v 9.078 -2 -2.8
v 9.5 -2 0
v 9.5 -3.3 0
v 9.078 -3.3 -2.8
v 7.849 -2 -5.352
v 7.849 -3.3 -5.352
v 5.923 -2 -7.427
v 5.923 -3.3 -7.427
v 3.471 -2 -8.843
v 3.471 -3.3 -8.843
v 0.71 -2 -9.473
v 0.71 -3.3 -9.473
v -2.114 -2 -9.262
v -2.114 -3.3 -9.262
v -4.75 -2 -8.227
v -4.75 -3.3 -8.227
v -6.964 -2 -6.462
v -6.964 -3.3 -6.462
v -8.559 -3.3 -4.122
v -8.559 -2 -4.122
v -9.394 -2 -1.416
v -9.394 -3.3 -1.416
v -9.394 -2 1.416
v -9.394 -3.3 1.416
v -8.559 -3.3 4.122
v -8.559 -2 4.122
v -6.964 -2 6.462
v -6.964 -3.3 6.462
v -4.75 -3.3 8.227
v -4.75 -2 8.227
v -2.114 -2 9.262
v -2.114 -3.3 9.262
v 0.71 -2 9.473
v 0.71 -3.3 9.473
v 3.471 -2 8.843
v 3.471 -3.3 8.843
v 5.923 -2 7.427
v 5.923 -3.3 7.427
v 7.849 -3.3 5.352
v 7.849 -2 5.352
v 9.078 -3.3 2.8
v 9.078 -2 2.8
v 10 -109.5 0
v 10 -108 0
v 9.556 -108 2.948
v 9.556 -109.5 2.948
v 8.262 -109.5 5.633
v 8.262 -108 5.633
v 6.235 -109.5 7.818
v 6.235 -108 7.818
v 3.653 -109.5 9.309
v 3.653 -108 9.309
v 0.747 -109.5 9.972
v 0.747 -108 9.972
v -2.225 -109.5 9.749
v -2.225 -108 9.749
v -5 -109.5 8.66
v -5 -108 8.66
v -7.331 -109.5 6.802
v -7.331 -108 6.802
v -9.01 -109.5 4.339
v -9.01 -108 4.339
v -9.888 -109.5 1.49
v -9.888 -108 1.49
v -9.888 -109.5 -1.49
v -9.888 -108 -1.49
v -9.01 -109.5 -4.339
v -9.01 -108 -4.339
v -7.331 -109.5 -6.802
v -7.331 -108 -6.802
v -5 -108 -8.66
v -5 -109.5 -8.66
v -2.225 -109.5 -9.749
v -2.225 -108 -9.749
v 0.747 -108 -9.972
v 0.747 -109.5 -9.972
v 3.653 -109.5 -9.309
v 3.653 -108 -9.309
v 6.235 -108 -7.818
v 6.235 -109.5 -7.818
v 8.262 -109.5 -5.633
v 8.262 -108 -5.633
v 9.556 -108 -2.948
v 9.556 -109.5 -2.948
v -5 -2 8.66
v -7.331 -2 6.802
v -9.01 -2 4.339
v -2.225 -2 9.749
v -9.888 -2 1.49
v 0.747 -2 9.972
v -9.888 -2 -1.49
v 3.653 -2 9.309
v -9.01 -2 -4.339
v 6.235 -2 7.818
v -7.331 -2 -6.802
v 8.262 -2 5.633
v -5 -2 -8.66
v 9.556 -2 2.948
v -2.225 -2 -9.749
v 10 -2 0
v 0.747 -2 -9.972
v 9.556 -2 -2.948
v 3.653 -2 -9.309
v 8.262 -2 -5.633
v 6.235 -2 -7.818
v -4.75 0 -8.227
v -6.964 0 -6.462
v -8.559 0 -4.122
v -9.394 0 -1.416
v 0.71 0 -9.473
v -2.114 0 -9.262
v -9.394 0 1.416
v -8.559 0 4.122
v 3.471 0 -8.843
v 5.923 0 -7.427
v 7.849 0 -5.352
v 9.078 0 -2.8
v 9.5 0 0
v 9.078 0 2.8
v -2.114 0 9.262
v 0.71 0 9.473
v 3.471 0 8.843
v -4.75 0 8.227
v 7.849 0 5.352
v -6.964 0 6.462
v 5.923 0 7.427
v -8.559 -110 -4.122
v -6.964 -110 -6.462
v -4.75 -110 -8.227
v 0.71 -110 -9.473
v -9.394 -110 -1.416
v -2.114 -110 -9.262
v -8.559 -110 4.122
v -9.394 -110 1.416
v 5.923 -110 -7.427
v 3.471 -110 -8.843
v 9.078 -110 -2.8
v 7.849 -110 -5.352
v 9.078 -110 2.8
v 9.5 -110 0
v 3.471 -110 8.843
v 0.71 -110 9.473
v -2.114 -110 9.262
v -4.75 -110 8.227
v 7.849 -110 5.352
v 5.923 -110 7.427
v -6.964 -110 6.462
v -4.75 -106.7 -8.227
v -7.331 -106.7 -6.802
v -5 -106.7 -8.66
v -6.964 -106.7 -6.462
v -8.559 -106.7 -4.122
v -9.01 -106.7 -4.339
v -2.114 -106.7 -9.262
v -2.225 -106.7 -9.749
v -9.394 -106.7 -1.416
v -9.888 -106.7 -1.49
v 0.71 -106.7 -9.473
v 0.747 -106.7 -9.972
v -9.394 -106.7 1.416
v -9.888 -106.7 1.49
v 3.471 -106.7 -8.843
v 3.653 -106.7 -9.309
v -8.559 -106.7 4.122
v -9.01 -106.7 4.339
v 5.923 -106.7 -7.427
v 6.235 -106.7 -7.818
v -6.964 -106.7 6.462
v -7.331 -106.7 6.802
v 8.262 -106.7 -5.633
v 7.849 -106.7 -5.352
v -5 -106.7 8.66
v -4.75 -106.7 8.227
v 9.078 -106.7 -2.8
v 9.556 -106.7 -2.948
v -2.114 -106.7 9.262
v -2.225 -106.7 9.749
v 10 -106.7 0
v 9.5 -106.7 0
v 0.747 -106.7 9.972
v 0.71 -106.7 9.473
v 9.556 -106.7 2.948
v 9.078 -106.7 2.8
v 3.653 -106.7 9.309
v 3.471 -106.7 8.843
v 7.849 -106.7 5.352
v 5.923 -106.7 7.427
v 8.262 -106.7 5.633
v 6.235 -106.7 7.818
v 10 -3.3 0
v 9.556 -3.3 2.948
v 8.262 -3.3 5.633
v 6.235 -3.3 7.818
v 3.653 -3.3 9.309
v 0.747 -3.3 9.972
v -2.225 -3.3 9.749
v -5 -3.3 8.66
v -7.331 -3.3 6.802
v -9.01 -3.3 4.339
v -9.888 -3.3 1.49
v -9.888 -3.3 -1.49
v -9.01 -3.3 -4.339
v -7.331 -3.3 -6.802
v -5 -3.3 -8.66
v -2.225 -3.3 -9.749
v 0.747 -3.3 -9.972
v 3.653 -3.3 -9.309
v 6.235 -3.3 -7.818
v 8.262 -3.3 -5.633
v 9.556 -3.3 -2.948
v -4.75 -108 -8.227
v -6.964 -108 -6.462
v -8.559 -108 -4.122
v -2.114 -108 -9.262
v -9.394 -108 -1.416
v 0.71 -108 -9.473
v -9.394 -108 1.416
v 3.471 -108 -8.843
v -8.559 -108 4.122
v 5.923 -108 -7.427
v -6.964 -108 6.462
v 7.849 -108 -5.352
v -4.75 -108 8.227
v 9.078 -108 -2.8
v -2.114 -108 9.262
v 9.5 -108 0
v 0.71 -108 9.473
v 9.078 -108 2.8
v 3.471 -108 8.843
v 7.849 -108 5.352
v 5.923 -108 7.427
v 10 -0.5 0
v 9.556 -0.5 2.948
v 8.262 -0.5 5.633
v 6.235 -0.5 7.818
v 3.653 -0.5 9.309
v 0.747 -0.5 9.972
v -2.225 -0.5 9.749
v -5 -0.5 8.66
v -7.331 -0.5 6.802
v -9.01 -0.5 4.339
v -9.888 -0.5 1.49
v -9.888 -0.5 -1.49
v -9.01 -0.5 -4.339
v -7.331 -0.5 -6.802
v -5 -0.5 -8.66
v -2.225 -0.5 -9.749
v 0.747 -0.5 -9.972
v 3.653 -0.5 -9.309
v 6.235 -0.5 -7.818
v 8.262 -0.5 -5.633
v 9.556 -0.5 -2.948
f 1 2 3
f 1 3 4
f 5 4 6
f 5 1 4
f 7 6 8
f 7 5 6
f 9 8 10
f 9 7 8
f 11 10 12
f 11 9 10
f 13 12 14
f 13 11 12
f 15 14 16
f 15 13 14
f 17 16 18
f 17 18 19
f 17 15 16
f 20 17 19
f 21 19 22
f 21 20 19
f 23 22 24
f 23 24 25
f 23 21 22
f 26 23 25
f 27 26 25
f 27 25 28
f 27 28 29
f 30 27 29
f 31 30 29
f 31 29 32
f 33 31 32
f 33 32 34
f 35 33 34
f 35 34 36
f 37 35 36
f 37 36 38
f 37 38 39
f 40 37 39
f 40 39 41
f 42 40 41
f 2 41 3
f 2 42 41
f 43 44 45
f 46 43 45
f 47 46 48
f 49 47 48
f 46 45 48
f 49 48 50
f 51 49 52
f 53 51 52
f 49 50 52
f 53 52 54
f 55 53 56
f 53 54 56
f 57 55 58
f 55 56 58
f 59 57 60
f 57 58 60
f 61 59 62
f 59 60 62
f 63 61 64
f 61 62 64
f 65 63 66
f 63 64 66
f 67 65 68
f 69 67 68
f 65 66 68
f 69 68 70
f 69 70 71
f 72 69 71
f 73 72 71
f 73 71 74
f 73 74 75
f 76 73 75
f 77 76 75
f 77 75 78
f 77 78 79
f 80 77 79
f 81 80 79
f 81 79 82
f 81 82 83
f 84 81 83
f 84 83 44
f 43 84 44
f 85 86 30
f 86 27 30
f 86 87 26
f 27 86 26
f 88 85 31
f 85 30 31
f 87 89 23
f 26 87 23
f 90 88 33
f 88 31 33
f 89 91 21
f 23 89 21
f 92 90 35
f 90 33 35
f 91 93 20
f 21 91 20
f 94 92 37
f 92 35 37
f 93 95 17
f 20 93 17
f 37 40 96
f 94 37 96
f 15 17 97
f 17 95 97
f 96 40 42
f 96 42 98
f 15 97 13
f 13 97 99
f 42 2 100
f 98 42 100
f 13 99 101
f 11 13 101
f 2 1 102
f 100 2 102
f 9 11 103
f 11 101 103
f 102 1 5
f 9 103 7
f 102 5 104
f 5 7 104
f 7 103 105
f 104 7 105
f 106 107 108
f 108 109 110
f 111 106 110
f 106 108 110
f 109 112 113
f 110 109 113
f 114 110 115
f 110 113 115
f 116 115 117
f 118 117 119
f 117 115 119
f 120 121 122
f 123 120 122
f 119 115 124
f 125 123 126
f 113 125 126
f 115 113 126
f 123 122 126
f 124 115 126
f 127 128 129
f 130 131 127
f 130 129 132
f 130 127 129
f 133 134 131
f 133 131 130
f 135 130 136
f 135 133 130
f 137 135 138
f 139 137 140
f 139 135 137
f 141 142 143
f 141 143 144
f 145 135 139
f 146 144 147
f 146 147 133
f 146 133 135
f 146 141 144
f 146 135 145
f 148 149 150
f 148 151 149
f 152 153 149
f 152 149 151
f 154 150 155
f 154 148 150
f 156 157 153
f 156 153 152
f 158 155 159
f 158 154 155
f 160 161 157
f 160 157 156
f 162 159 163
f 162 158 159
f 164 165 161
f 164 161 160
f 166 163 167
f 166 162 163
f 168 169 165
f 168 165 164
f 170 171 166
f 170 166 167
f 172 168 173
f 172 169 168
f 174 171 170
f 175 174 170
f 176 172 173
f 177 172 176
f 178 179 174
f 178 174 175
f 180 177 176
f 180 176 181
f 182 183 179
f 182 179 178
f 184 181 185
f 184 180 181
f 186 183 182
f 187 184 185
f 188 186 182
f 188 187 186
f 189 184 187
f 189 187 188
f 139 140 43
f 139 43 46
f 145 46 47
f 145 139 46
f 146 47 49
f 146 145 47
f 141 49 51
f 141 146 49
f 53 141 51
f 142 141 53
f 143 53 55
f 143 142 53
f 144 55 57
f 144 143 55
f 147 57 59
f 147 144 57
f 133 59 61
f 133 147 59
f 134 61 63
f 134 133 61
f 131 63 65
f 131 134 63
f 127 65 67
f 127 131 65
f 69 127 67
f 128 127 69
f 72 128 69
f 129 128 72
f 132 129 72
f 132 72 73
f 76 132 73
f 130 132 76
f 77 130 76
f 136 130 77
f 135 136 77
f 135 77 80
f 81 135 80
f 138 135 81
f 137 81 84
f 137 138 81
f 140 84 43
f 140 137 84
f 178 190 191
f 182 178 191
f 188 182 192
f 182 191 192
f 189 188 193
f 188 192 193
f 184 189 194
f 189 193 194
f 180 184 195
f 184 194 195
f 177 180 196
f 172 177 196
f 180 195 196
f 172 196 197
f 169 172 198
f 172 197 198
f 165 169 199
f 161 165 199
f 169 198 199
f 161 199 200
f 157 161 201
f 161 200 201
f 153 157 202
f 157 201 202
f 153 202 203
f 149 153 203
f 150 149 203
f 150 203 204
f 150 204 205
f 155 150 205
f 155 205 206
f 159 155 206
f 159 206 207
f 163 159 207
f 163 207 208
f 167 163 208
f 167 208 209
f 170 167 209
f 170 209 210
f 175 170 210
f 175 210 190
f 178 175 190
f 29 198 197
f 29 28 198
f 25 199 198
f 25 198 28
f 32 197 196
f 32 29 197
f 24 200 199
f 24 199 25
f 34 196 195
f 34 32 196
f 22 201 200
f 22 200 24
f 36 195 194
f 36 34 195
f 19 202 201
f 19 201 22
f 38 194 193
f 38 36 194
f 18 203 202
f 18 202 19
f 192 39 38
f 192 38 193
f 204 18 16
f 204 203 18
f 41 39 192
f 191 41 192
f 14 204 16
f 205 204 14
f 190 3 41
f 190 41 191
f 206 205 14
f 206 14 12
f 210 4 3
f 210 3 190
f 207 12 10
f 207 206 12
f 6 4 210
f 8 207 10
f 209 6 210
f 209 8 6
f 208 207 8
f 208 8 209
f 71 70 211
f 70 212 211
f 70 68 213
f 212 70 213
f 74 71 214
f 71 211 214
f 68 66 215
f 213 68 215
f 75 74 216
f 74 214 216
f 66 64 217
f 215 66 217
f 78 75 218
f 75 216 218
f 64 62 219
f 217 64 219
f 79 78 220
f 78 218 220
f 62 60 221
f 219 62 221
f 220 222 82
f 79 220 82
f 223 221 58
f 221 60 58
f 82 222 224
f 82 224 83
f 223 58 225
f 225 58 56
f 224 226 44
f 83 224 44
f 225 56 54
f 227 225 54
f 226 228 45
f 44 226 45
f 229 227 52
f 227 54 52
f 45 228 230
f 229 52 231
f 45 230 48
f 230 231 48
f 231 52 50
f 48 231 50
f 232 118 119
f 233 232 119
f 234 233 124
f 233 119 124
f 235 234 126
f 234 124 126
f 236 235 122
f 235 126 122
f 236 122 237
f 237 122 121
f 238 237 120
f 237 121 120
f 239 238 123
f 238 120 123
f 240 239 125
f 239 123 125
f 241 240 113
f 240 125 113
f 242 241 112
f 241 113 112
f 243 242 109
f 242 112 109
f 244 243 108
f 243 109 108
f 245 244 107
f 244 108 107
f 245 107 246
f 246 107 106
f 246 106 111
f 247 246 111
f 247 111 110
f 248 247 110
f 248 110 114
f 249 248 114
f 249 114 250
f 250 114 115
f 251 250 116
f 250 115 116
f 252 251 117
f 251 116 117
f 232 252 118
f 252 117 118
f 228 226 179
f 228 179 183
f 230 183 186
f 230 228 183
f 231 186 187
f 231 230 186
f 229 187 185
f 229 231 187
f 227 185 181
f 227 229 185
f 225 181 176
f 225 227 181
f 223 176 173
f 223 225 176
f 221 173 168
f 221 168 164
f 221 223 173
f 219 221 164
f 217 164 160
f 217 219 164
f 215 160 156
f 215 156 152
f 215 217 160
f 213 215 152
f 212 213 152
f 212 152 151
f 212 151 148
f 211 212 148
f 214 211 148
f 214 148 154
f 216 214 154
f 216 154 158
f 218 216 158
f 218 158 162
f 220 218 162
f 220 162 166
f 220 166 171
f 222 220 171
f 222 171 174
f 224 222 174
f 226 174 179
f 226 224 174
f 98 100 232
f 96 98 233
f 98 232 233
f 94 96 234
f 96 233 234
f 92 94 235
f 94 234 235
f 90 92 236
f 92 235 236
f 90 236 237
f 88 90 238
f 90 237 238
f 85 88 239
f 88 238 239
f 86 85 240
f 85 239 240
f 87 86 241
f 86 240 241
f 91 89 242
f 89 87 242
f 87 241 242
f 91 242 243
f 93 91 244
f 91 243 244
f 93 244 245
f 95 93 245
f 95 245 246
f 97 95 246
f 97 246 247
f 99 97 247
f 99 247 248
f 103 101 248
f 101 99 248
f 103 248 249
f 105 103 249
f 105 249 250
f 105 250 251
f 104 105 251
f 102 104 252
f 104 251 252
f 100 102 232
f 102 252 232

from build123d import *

# Parameters (mm, degrees)
F0_R     = 10
F1_DEPTH = 110
F3_R     = 10
F3_R_2   = 9.5
F4_DEPTH = 1.3
F6_R     = 10
F6_R_2   = 9.5
F7_DEPTH = 1.3
F8_SIZE  = 0.5


with BuildPart() as f1:
    # F0 (on Front) → F1 (new body)
    with BuildSketch(Plane.XZ):
        Circle(F0_R)
    extrude(amount=F1_DEPTH)

    # F3 (on offset) → F4 (cut)
    with BuildSketch(Plane.XZ.offset(108)):
        Circle(F3_R)
        Circle(F3_R_2, mode=Mode.SUBTRACT)
    extrude(amount=-F4_DEPTH, mode=Mode.SUBTRACT)

    # F6 (on offset) → F7 (cut)
    with BuildSketch(Plane(origin=(0, -2, 0), x_dir=(1, 0, 0), z_dir=(0, 1, 0))):
        Circle(F6_R)
        Circle(F6_R_2, mode=Mode.SUBTRACT)
    extrude(amount=-F7_DEPTH, mode=Mode.SUBTRACT)

    # F8
    f8_edges = [f1.edges().sort_by_distance(p)[0] for p in [
        (-10, -110, 0),
        (-10, 0, 0),
    ]]
    chamfer(f8_edges, length=F8_SIZE)


solid = f1.part
